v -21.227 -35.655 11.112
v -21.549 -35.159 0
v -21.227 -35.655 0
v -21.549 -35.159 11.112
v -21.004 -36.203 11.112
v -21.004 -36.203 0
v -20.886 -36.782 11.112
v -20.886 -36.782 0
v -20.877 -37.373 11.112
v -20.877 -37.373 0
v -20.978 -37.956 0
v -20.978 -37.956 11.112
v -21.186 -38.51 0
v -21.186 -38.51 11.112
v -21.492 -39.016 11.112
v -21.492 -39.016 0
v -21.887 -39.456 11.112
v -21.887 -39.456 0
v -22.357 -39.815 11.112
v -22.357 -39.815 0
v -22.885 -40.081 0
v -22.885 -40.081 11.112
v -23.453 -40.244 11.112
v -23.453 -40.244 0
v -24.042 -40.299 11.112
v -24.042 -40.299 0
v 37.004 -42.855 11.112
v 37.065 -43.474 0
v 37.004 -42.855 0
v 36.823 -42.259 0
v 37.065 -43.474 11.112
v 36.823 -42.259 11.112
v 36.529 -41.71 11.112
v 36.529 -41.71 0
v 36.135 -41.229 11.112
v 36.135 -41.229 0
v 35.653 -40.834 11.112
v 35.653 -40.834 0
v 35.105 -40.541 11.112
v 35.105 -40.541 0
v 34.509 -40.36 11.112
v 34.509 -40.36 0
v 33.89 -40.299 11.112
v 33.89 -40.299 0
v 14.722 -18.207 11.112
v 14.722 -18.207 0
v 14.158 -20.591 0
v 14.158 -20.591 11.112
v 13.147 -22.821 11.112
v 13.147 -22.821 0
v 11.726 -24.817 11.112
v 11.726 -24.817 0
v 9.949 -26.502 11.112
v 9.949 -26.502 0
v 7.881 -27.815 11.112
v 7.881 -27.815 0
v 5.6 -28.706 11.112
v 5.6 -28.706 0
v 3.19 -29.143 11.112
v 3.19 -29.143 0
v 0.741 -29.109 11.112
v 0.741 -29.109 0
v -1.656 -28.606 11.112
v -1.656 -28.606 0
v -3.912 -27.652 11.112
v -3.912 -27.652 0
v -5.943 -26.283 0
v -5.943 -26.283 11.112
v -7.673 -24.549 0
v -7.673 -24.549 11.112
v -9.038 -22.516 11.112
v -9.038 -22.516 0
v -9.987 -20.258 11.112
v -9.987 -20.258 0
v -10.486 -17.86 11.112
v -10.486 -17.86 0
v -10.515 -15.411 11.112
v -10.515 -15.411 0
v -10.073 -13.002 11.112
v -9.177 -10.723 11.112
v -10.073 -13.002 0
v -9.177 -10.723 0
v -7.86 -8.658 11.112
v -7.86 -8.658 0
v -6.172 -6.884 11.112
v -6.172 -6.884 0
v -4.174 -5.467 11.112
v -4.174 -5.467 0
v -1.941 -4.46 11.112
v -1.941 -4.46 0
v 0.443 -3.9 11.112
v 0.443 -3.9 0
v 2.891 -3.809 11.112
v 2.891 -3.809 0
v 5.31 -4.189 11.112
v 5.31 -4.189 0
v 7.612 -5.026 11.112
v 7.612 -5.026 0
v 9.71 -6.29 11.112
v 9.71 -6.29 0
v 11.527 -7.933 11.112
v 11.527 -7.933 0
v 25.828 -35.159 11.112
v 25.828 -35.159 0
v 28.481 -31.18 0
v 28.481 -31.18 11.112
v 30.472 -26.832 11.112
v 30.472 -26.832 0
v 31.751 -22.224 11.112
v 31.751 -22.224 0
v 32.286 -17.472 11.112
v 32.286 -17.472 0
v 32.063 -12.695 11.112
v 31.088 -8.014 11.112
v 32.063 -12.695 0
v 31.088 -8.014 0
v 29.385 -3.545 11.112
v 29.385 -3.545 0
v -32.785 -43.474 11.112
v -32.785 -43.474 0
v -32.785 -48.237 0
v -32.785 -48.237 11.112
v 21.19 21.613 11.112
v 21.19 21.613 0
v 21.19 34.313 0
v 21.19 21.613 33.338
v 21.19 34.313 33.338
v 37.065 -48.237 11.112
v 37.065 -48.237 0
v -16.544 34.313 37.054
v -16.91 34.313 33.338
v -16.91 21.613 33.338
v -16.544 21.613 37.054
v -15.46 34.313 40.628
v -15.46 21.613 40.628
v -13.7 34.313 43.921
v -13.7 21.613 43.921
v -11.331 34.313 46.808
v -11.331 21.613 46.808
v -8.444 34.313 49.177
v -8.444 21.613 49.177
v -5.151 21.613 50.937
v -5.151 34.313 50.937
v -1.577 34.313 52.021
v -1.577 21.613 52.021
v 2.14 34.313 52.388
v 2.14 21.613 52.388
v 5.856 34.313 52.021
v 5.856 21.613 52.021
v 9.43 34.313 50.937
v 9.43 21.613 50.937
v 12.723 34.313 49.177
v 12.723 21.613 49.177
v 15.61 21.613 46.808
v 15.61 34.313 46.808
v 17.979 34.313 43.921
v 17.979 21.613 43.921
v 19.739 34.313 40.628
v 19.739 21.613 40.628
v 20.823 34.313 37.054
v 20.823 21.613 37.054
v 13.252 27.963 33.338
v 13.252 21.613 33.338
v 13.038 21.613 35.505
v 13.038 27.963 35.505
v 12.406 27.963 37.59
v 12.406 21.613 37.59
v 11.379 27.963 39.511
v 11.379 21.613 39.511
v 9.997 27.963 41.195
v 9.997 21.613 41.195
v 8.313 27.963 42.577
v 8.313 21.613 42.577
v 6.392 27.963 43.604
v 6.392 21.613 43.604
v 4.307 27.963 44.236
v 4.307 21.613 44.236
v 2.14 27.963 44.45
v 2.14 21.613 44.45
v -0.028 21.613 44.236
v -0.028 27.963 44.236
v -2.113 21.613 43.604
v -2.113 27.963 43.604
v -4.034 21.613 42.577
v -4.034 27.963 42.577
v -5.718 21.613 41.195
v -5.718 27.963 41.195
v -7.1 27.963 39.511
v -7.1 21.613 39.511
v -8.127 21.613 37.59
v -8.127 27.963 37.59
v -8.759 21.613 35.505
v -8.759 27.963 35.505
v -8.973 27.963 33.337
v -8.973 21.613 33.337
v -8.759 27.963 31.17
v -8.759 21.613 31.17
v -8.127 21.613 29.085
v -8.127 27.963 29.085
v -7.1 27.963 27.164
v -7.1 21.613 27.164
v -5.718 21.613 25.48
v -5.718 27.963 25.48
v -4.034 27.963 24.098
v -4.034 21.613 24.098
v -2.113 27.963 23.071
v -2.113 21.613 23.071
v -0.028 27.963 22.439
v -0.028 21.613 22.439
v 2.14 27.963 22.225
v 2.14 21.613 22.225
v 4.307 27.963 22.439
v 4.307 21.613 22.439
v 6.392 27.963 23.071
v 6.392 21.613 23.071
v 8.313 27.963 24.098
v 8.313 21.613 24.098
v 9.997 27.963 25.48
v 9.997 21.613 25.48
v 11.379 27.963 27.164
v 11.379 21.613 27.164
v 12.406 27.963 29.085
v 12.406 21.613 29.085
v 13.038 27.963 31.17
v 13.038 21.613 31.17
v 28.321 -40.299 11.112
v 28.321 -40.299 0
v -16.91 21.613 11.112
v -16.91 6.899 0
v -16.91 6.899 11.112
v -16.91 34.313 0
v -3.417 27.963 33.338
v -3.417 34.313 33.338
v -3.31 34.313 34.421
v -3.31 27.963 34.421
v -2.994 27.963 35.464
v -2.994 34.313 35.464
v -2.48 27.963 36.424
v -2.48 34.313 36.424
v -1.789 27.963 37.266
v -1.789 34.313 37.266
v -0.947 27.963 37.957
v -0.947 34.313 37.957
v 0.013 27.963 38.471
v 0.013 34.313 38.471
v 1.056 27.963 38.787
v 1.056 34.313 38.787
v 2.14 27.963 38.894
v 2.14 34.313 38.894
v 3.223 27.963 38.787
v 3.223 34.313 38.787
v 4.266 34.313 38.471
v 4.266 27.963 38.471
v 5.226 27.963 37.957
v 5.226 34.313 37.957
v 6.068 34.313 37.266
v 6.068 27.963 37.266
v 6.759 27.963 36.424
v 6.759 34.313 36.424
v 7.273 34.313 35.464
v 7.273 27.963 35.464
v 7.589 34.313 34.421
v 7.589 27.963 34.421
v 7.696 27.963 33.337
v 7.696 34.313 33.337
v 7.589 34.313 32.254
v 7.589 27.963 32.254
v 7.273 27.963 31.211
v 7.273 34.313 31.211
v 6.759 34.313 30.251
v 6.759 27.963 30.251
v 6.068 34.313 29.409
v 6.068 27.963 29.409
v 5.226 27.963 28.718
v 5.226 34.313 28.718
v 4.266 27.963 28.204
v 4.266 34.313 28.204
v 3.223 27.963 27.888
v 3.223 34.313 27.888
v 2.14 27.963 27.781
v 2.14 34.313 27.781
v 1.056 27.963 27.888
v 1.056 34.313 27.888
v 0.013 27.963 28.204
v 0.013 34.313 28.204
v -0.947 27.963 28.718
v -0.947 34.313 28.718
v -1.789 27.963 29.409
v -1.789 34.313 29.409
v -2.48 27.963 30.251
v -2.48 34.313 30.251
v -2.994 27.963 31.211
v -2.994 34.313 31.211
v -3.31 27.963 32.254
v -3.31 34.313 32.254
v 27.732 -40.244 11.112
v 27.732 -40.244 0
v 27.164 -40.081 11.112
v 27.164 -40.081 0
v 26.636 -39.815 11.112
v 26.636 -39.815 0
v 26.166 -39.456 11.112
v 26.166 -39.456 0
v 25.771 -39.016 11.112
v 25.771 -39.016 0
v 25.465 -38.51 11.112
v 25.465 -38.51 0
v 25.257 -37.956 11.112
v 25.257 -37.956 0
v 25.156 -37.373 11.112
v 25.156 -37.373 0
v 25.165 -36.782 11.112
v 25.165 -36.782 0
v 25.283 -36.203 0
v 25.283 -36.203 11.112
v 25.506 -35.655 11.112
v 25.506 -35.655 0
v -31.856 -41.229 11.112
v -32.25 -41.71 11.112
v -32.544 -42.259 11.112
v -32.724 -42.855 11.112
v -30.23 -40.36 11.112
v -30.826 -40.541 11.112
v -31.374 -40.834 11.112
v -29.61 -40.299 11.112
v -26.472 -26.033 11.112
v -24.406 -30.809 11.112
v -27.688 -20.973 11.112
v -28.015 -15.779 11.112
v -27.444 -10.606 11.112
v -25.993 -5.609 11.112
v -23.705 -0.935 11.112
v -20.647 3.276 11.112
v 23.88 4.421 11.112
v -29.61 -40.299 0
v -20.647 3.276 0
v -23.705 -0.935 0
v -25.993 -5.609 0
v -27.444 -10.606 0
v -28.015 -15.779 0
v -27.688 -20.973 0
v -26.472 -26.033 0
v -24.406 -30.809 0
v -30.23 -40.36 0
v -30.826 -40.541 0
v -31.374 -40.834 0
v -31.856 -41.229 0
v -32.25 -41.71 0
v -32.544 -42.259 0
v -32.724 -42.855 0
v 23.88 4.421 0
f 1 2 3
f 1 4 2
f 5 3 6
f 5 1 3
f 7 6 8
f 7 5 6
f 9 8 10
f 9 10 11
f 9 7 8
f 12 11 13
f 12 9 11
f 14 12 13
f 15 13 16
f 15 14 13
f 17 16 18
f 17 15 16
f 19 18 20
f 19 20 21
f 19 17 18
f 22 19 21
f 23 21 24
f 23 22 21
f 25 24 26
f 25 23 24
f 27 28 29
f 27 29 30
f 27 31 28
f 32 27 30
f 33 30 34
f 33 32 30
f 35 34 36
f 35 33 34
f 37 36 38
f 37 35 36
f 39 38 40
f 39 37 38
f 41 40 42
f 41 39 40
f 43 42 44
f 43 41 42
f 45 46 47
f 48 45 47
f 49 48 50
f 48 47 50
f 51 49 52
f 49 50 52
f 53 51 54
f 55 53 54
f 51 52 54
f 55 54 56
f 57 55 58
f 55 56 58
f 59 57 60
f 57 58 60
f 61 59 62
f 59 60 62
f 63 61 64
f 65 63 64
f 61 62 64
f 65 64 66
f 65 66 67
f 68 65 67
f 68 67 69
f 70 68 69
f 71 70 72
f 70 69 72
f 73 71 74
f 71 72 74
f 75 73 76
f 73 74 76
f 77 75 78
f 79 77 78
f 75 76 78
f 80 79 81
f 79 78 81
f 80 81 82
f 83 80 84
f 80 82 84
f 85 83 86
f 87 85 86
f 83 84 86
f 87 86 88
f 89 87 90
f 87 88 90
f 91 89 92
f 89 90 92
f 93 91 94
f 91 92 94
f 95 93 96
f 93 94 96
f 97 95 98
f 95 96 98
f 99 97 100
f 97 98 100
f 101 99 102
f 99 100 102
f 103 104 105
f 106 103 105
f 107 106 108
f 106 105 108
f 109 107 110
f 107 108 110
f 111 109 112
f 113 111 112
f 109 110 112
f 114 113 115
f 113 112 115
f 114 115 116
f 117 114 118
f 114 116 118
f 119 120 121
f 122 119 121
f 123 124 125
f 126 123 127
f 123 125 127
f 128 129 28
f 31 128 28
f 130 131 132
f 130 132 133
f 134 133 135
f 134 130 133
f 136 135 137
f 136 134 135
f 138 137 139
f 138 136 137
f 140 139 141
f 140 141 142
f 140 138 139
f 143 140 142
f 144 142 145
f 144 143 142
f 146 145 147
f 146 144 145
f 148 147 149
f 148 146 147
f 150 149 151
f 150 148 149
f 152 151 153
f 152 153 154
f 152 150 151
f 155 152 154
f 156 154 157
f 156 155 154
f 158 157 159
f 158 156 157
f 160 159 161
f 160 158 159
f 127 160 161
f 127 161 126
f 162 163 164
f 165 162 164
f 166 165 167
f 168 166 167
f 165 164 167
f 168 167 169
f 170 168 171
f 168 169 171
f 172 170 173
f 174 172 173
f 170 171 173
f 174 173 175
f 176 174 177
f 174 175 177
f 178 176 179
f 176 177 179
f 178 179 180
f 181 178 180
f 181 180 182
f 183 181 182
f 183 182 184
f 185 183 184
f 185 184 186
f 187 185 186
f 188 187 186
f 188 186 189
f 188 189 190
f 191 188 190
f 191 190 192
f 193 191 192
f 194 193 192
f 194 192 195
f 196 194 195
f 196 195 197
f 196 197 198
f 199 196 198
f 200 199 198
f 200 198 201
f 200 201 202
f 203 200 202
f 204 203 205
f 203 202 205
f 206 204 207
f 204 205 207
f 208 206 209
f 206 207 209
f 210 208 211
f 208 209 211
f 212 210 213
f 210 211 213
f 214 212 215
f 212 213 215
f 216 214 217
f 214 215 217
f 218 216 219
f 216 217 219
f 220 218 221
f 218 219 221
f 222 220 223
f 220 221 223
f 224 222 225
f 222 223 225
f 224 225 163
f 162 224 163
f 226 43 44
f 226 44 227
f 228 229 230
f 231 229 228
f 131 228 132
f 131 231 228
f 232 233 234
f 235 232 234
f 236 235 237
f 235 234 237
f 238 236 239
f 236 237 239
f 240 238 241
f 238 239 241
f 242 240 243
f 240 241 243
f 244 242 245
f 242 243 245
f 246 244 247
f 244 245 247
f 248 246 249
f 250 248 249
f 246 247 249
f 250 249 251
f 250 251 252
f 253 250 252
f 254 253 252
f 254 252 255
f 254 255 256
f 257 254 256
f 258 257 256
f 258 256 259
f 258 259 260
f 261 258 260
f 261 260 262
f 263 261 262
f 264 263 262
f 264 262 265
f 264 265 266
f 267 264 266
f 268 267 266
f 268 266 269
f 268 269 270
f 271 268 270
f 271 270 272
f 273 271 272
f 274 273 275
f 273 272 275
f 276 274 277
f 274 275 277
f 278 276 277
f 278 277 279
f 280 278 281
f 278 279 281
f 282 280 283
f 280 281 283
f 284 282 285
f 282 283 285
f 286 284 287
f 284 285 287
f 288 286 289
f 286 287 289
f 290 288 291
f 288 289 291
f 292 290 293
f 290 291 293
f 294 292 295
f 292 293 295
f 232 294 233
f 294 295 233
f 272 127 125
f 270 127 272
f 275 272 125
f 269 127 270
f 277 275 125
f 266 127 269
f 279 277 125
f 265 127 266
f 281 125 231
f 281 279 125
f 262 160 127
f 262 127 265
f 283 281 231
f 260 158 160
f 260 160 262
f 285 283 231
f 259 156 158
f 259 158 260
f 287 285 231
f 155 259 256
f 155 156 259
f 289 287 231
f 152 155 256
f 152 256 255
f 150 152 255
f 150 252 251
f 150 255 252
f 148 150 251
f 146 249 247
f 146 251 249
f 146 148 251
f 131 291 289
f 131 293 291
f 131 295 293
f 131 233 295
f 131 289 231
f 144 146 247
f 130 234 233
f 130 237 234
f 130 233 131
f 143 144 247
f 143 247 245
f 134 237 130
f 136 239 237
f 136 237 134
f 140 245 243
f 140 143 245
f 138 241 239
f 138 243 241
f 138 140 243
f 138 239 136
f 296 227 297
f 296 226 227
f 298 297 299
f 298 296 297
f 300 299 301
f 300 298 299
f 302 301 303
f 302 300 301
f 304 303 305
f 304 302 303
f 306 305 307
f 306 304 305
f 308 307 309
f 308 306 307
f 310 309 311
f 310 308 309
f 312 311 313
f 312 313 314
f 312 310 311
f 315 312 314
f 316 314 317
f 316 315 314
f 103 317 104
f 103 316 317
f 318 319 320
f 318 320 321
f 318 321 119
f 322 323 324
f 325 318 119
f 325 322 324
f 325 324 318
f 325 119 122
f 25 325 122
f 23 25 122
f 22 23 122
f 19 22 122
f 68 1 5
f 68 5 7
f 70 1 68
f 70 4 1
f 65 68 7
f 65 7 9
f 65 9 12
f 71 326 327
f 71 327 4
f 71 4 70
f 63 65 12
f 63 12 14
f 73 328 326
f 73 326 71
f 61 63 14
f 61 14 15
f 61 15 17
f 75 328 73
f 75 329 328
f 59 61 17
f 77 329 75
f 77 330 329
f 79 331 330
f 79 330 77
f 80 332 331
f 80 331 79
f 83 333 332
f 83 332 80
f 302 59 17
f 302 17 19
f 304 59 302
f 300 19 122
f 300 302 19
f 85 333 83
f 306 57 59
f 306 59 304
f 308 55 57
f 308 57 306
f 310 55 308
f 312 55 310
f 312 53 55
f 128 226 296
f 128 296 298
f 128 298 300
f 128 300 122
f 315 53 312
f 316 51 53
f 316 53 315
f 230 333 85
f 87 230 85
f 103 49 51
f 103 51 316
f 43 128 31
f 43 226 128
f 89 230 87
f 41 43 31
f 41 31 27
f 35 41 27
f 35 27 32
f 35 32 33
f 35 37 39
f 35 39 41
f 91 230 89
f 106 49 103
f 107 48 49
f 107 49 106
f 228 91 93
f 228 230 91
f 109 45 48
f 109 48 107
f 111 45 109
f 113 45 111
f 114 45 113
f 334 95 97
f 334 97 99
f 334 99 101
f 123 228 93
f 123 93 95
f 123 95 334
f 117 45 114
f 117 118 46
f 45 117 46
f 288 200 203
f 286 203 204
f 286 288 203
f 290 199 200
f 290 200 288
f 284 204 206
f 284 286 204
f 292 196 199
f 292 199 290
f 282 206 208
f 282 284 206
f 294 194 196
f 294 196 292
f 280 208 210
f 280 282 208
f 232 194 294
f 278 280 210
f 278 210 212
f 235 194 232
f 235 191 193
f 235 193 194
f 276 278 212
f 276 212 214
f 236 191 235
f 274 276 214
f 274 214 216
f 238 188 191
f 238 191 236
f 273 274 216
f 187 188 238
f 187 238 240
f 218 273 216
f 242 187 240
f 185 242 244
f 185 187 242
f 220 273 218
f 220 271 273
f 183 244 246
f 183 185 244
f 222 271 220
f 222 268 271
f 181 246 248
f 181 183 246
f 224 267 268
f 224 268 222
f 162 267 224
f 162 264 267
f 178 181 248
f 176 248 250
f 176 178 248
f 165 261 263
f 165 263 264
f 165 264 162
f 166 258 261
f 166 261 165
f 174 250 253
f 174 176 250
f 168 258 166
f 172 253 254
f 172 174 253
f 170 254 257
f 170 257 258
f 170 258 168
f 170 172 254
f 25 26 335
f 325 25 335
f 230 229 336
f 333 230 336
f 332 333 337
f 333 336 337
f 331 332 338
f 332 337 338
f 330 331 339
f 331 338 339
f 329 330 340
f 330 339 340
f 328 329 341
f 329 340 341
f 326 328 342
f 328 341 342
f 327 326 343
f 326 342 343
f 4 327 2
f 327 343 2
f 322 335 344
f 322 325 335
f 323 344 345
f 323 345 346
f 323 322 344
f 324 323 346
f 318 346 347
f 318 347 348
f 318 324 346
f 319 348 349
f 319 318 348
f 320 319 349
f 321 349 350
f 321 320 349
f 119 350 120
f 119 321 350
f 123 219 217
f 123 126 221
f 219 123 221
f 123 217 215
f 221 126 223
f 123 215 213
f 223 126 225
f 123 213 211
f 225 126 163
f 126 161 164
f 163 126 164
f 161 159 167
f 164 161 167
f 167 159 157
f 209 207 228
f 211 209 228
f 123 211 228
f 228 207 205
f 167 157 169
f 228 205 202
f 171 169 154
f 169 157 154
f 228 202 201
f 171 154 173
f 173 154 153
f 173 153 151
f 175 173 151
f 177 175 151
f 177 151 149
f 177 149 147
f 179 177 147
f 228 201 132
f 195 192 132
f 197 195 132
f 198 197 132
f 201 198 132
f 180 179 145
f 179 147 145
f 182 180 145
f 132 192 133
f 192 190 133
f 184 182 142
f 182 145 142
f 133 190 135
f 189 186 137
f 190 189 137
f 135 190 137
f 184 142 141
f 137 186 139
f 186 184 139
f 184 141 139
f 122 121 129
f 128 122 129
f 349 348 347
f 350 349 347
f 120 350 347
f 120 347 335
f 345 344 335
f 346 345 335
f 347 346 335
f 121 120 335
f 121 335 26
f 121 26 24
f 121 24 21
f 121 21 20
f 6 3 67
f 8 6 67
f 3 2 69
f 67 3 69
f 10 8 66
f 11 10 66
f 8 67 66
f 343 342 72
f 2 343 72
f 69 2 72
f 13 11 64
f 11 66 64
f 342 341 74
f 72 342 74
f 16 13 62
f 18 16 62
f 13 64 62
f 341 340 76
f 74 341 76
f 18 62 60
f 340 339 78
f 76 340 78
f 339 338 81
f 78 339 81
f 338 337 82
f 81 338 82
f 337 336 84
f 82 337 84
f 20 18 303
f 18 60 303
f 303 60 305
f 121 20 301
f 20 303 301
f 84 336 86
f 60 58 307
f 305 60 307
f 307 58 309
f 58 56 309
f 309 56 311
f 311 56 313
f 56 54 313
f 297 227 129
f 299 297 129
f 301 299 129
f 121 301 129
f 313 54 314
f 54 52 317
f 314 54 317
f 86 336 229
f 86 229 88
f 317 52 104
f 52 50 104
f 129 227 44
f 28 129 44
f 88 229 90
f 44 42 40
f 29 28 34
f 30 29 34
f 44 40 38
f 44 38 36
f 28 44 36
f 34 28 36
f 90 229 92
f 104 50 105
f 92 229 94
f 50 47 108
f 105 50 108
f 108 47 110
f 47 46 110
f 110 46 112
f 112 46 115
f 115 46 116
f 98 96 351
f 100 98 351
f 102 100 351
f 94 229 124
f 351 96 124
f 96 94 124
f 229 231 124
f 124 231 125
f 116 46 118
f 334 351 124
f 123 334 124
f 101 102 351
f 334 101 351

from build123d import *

# Parameters (mm, degrees)
F0_W           = 38.1
F0_H           = 12.7
F1_DEPTH       = 11.1125
F2_W           = 38.1
F2_H           = 22.225
F3_DEPTH       = 12.7
F5_D           = 11.1125
F5_DEPTH       = 12.7
F5_CBORE_D     = 22.225
F5_CBORE_DEPTH = 6.35
F6_R           = 3.175


with BuildPart() as f1:
    # F0 (on Top) → F1 (new body)
    with BuildSketch(Plane.XY):
        with BuildLine():
            ThreePointArc((-16.910493, 6.898722), (-28.021043, -16.829595), (-16.373765, -40.299113))
            ThreePointArc((-16.373765, -40.299113), (2.139507, -46.649113), (20.652779, -40.299113))
            ThreePointArc((20.652779, -40.299113), (31.485209, -23.458425), (29.384606, -3.545168))
            Line((29.384606, -3.545168), (14.72239, -18.207384))
            ThreePointArc((14.72239, -18.207384), (-9.987481, -20.25837), (11.526728, -7.932662))
            Line((11.526728, -7.932662), (23.880181, 4.42079))
            Line((23.880181, 4.42079), (21.189507, 21.613387))
            Line((21.189507, 21.613387), (-16.910493, 21.613387))
            Line((-16.910493, 21.613387), (-16.910493, 6.898722))
        make_face()
        with Locations((2.139507, 27.963387)):
            Rectangle(F0_W, F0_H)
        with BuildLine():
            Line((-16.373765, -40.299113), (-32.785493, -40.299113))
            Line((-32.785493, -40.299113), (-32.785493, -48.236613))
            Line((-32.785493, -48.236613), (37.064507, -48.236613))
            Line((37.064507, -48.236613), (37.064507, -40.299113))
            Line((37.064507, -40.299113), (20.652779, -40.299113))
            ThreePointArc((20.652779, -40.299113), (2.139507, -46.649113), (-16.373765, -40.299113))
        make_face()
    extrude(amount=F1_DEPTH)

    # F2 (on face) → F3 (join)
    with BuildSketch(Plane(origin=(0, 34.313387, 0), x_dir=(-1, 0, 0), z_dir=(0, 1, 0))):
        with BuildLine():
            ThreePointArc((16.910493, 33.3375), (-2.139507, 52.3875), (-21.189507, 33.3375))
            Line((-21.189507, 33.3375), (16.910493, 33.3375))
        make_face()
        with Locations((-2.139507, 22.225)):
            Rectangle(F2_W, F2_H)
    extrude(amount=-F3_DEPTH)

    # F5
    with Locations(Plane.XZ.offset(-21.613387)):
        with Locations((2.139507, 33.3375)):
            CounterBoreHole(F5_D / 2, F5_CBORE_D / 2, F5_CBORE_DEPTH, depth=F5_DEPTH)

    # F6
    f6_edges = [f1.edges().sort_by_distance(p)[0] for p in [
        (37.064507, -40.299113, 5.55625),
        (20.652779, -40.299113, 5.55625),
        (-16.373765, -40.299113, 5.55625),
        (-32.785493, -40.299113, 5.55625),
    ]]
    fillet(f6_edges, radius=F6_R)


solid = f1.part
